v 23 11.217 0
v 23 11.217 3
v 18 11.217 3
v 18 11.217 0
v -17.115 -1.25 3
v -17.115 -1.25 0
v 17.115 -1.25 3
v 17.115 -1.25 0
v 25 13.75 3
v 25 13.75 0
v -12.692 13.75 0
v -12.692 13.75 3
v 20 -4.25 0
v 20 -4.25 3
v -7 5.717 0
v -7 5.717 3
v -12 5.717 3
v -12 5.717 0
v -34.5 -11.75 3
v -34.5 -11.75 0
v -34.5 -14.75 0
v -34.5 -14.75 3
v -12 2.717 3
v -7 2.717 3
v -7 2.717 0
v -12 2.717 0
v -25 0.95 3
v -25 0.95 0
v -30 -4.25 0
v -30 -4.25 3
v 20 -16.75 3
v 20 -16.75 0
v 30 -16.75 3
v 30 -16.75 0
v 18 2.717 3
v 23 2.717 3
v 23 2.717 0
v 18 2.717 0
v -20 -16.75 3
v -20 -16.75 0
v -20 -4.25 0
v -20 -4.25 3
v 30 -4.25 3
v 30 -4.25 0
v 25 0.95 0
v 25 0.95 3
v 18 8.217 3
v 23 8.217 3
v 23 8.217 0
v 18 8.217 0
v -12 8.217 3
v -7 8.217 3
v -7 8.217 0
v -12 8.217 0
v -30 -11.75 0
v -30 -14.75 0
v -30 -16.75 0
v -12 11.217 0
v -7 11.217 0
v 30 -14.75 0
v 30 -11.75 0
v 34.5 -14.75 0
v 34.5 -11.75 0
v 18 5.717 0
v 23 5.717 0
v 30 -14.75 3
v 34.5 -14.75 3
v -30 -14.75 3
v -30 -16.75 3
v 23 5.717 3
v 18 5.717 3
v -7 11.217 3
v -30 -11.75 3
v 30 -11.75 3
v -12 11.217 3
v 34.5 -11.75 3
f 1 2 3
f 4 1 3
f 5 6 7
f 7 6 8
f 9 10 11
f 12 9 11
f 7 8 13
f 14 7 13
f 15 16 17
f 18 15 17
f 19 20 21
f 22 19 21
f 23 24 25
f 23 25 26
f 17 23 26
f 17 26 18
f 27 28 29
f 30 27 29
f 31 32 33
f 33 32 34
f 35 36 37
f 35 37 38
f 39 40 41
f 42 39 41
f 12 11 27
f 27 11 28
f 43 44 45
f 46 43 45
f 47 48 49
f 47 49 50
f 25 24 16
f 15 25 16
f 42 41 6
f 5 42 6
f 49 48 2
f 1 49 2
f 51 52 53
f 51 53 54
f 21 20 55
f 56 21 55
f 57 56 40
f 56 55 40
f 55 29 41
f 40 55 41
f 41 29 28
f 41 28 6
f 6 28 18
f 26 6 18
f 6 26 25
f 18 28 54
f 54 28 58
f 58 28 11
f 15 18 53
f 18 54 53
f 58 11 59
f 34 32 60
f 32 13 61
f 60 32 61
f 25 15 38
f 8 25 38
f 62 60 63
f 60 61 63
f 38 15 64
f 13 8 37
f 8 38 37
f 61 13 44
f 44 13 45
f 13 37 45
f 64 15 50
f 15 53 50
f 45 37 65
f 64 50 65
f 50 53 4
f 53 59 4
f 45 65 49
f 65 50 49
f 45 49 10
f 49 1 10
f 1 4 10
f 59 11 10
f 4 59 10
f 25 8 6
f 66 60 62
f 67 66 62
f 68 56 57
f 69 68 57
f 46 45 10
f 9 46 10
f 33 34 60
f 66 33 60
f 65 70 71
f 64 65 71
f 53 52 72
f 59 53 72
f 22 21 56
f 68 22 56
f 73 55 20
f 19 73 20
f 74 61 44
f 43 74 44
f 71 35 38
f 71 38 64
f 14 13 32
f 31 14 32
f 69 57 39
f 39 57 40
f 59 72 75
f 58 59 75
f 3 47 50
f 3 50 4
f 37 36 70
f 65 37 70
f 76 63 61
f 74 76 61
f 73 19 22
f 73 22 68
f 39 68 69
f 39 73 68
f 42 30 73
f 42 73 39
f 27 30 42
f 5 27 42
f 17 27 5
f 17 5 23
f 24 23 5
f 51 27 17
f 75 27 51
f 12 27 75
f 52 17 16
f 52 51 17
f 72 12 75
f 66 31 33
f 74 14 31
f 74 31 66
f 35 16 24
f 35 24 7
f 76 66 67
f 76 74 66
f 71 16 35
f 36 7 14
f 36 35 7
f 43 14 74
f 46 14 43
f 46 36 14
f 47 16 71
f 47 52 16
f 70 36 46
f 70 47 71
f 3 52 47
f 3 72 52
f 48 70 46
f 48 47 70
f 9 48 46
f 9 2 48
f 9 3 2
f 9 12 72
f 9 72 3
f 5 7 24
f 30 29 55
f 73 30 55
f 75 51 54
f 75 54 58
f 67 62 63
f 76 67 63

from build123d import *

# Parameters (mm, degrees)
BOSS_EXTRUDE1_DEPTH = 3
SKETCH2_W           = 5
SKETCH2_H           = 3
CUT_EXTRUDE2_DEPTH  = 3


with BuildPart() as part:
    # Sketch1 → Boss-Extrude1 (new body)
    with BuildSketch(Plane.XY):
        Polygon((30, -11.75), (30, -4.25), (25, 0.95), (25, 13.75), (-12.692307692, 13.75), (-25, 0.95), (-30, -4.25), (-30, -11.75), (-34.5, -11.75), (-34.5, -14.75), (-30, -14.75), (-30, -16.75), (-20, -16.75), (-20, -4.25), (-17.115384615, -1.25), (17.115384615, -1.25), (20, -4.25), (20, -16.75), (30, -16.75), (30, -14.75), (34.5, -14.75), (34.5, -11.75), align=None)
    extrude(amount=BOSS_EXTRUDE1_DEPTH)

    # Sketch2 → Cut-Extrude2 (cut)
    with BuildSketch(Plane(origin=(0, 0, 3), x_dir=(-1, 0, 0), z_dir=(0, 0, -1))):
        with Locations((9.5, 4.217126269)):
            Rectangle(SKETCH2_W, SKETCH2_H)
        with Locations((9.5, 9.717126269)):
            Rectangle(SKETCH2_W, SKETCH2_H)
        with Locations((-20.5, 4.217126269)):
            Rectangle(SKETCH2_W, SKETCH2_H)
        with Locations((-20.5, 9.717126269)):
            Rectangle(SKETCH2_W, SKETCH2_H)
    extrude(amount=CUT_EXTRUDE2_DEPTH, mode=Mode.SUBTRACT)


solid = part.part
